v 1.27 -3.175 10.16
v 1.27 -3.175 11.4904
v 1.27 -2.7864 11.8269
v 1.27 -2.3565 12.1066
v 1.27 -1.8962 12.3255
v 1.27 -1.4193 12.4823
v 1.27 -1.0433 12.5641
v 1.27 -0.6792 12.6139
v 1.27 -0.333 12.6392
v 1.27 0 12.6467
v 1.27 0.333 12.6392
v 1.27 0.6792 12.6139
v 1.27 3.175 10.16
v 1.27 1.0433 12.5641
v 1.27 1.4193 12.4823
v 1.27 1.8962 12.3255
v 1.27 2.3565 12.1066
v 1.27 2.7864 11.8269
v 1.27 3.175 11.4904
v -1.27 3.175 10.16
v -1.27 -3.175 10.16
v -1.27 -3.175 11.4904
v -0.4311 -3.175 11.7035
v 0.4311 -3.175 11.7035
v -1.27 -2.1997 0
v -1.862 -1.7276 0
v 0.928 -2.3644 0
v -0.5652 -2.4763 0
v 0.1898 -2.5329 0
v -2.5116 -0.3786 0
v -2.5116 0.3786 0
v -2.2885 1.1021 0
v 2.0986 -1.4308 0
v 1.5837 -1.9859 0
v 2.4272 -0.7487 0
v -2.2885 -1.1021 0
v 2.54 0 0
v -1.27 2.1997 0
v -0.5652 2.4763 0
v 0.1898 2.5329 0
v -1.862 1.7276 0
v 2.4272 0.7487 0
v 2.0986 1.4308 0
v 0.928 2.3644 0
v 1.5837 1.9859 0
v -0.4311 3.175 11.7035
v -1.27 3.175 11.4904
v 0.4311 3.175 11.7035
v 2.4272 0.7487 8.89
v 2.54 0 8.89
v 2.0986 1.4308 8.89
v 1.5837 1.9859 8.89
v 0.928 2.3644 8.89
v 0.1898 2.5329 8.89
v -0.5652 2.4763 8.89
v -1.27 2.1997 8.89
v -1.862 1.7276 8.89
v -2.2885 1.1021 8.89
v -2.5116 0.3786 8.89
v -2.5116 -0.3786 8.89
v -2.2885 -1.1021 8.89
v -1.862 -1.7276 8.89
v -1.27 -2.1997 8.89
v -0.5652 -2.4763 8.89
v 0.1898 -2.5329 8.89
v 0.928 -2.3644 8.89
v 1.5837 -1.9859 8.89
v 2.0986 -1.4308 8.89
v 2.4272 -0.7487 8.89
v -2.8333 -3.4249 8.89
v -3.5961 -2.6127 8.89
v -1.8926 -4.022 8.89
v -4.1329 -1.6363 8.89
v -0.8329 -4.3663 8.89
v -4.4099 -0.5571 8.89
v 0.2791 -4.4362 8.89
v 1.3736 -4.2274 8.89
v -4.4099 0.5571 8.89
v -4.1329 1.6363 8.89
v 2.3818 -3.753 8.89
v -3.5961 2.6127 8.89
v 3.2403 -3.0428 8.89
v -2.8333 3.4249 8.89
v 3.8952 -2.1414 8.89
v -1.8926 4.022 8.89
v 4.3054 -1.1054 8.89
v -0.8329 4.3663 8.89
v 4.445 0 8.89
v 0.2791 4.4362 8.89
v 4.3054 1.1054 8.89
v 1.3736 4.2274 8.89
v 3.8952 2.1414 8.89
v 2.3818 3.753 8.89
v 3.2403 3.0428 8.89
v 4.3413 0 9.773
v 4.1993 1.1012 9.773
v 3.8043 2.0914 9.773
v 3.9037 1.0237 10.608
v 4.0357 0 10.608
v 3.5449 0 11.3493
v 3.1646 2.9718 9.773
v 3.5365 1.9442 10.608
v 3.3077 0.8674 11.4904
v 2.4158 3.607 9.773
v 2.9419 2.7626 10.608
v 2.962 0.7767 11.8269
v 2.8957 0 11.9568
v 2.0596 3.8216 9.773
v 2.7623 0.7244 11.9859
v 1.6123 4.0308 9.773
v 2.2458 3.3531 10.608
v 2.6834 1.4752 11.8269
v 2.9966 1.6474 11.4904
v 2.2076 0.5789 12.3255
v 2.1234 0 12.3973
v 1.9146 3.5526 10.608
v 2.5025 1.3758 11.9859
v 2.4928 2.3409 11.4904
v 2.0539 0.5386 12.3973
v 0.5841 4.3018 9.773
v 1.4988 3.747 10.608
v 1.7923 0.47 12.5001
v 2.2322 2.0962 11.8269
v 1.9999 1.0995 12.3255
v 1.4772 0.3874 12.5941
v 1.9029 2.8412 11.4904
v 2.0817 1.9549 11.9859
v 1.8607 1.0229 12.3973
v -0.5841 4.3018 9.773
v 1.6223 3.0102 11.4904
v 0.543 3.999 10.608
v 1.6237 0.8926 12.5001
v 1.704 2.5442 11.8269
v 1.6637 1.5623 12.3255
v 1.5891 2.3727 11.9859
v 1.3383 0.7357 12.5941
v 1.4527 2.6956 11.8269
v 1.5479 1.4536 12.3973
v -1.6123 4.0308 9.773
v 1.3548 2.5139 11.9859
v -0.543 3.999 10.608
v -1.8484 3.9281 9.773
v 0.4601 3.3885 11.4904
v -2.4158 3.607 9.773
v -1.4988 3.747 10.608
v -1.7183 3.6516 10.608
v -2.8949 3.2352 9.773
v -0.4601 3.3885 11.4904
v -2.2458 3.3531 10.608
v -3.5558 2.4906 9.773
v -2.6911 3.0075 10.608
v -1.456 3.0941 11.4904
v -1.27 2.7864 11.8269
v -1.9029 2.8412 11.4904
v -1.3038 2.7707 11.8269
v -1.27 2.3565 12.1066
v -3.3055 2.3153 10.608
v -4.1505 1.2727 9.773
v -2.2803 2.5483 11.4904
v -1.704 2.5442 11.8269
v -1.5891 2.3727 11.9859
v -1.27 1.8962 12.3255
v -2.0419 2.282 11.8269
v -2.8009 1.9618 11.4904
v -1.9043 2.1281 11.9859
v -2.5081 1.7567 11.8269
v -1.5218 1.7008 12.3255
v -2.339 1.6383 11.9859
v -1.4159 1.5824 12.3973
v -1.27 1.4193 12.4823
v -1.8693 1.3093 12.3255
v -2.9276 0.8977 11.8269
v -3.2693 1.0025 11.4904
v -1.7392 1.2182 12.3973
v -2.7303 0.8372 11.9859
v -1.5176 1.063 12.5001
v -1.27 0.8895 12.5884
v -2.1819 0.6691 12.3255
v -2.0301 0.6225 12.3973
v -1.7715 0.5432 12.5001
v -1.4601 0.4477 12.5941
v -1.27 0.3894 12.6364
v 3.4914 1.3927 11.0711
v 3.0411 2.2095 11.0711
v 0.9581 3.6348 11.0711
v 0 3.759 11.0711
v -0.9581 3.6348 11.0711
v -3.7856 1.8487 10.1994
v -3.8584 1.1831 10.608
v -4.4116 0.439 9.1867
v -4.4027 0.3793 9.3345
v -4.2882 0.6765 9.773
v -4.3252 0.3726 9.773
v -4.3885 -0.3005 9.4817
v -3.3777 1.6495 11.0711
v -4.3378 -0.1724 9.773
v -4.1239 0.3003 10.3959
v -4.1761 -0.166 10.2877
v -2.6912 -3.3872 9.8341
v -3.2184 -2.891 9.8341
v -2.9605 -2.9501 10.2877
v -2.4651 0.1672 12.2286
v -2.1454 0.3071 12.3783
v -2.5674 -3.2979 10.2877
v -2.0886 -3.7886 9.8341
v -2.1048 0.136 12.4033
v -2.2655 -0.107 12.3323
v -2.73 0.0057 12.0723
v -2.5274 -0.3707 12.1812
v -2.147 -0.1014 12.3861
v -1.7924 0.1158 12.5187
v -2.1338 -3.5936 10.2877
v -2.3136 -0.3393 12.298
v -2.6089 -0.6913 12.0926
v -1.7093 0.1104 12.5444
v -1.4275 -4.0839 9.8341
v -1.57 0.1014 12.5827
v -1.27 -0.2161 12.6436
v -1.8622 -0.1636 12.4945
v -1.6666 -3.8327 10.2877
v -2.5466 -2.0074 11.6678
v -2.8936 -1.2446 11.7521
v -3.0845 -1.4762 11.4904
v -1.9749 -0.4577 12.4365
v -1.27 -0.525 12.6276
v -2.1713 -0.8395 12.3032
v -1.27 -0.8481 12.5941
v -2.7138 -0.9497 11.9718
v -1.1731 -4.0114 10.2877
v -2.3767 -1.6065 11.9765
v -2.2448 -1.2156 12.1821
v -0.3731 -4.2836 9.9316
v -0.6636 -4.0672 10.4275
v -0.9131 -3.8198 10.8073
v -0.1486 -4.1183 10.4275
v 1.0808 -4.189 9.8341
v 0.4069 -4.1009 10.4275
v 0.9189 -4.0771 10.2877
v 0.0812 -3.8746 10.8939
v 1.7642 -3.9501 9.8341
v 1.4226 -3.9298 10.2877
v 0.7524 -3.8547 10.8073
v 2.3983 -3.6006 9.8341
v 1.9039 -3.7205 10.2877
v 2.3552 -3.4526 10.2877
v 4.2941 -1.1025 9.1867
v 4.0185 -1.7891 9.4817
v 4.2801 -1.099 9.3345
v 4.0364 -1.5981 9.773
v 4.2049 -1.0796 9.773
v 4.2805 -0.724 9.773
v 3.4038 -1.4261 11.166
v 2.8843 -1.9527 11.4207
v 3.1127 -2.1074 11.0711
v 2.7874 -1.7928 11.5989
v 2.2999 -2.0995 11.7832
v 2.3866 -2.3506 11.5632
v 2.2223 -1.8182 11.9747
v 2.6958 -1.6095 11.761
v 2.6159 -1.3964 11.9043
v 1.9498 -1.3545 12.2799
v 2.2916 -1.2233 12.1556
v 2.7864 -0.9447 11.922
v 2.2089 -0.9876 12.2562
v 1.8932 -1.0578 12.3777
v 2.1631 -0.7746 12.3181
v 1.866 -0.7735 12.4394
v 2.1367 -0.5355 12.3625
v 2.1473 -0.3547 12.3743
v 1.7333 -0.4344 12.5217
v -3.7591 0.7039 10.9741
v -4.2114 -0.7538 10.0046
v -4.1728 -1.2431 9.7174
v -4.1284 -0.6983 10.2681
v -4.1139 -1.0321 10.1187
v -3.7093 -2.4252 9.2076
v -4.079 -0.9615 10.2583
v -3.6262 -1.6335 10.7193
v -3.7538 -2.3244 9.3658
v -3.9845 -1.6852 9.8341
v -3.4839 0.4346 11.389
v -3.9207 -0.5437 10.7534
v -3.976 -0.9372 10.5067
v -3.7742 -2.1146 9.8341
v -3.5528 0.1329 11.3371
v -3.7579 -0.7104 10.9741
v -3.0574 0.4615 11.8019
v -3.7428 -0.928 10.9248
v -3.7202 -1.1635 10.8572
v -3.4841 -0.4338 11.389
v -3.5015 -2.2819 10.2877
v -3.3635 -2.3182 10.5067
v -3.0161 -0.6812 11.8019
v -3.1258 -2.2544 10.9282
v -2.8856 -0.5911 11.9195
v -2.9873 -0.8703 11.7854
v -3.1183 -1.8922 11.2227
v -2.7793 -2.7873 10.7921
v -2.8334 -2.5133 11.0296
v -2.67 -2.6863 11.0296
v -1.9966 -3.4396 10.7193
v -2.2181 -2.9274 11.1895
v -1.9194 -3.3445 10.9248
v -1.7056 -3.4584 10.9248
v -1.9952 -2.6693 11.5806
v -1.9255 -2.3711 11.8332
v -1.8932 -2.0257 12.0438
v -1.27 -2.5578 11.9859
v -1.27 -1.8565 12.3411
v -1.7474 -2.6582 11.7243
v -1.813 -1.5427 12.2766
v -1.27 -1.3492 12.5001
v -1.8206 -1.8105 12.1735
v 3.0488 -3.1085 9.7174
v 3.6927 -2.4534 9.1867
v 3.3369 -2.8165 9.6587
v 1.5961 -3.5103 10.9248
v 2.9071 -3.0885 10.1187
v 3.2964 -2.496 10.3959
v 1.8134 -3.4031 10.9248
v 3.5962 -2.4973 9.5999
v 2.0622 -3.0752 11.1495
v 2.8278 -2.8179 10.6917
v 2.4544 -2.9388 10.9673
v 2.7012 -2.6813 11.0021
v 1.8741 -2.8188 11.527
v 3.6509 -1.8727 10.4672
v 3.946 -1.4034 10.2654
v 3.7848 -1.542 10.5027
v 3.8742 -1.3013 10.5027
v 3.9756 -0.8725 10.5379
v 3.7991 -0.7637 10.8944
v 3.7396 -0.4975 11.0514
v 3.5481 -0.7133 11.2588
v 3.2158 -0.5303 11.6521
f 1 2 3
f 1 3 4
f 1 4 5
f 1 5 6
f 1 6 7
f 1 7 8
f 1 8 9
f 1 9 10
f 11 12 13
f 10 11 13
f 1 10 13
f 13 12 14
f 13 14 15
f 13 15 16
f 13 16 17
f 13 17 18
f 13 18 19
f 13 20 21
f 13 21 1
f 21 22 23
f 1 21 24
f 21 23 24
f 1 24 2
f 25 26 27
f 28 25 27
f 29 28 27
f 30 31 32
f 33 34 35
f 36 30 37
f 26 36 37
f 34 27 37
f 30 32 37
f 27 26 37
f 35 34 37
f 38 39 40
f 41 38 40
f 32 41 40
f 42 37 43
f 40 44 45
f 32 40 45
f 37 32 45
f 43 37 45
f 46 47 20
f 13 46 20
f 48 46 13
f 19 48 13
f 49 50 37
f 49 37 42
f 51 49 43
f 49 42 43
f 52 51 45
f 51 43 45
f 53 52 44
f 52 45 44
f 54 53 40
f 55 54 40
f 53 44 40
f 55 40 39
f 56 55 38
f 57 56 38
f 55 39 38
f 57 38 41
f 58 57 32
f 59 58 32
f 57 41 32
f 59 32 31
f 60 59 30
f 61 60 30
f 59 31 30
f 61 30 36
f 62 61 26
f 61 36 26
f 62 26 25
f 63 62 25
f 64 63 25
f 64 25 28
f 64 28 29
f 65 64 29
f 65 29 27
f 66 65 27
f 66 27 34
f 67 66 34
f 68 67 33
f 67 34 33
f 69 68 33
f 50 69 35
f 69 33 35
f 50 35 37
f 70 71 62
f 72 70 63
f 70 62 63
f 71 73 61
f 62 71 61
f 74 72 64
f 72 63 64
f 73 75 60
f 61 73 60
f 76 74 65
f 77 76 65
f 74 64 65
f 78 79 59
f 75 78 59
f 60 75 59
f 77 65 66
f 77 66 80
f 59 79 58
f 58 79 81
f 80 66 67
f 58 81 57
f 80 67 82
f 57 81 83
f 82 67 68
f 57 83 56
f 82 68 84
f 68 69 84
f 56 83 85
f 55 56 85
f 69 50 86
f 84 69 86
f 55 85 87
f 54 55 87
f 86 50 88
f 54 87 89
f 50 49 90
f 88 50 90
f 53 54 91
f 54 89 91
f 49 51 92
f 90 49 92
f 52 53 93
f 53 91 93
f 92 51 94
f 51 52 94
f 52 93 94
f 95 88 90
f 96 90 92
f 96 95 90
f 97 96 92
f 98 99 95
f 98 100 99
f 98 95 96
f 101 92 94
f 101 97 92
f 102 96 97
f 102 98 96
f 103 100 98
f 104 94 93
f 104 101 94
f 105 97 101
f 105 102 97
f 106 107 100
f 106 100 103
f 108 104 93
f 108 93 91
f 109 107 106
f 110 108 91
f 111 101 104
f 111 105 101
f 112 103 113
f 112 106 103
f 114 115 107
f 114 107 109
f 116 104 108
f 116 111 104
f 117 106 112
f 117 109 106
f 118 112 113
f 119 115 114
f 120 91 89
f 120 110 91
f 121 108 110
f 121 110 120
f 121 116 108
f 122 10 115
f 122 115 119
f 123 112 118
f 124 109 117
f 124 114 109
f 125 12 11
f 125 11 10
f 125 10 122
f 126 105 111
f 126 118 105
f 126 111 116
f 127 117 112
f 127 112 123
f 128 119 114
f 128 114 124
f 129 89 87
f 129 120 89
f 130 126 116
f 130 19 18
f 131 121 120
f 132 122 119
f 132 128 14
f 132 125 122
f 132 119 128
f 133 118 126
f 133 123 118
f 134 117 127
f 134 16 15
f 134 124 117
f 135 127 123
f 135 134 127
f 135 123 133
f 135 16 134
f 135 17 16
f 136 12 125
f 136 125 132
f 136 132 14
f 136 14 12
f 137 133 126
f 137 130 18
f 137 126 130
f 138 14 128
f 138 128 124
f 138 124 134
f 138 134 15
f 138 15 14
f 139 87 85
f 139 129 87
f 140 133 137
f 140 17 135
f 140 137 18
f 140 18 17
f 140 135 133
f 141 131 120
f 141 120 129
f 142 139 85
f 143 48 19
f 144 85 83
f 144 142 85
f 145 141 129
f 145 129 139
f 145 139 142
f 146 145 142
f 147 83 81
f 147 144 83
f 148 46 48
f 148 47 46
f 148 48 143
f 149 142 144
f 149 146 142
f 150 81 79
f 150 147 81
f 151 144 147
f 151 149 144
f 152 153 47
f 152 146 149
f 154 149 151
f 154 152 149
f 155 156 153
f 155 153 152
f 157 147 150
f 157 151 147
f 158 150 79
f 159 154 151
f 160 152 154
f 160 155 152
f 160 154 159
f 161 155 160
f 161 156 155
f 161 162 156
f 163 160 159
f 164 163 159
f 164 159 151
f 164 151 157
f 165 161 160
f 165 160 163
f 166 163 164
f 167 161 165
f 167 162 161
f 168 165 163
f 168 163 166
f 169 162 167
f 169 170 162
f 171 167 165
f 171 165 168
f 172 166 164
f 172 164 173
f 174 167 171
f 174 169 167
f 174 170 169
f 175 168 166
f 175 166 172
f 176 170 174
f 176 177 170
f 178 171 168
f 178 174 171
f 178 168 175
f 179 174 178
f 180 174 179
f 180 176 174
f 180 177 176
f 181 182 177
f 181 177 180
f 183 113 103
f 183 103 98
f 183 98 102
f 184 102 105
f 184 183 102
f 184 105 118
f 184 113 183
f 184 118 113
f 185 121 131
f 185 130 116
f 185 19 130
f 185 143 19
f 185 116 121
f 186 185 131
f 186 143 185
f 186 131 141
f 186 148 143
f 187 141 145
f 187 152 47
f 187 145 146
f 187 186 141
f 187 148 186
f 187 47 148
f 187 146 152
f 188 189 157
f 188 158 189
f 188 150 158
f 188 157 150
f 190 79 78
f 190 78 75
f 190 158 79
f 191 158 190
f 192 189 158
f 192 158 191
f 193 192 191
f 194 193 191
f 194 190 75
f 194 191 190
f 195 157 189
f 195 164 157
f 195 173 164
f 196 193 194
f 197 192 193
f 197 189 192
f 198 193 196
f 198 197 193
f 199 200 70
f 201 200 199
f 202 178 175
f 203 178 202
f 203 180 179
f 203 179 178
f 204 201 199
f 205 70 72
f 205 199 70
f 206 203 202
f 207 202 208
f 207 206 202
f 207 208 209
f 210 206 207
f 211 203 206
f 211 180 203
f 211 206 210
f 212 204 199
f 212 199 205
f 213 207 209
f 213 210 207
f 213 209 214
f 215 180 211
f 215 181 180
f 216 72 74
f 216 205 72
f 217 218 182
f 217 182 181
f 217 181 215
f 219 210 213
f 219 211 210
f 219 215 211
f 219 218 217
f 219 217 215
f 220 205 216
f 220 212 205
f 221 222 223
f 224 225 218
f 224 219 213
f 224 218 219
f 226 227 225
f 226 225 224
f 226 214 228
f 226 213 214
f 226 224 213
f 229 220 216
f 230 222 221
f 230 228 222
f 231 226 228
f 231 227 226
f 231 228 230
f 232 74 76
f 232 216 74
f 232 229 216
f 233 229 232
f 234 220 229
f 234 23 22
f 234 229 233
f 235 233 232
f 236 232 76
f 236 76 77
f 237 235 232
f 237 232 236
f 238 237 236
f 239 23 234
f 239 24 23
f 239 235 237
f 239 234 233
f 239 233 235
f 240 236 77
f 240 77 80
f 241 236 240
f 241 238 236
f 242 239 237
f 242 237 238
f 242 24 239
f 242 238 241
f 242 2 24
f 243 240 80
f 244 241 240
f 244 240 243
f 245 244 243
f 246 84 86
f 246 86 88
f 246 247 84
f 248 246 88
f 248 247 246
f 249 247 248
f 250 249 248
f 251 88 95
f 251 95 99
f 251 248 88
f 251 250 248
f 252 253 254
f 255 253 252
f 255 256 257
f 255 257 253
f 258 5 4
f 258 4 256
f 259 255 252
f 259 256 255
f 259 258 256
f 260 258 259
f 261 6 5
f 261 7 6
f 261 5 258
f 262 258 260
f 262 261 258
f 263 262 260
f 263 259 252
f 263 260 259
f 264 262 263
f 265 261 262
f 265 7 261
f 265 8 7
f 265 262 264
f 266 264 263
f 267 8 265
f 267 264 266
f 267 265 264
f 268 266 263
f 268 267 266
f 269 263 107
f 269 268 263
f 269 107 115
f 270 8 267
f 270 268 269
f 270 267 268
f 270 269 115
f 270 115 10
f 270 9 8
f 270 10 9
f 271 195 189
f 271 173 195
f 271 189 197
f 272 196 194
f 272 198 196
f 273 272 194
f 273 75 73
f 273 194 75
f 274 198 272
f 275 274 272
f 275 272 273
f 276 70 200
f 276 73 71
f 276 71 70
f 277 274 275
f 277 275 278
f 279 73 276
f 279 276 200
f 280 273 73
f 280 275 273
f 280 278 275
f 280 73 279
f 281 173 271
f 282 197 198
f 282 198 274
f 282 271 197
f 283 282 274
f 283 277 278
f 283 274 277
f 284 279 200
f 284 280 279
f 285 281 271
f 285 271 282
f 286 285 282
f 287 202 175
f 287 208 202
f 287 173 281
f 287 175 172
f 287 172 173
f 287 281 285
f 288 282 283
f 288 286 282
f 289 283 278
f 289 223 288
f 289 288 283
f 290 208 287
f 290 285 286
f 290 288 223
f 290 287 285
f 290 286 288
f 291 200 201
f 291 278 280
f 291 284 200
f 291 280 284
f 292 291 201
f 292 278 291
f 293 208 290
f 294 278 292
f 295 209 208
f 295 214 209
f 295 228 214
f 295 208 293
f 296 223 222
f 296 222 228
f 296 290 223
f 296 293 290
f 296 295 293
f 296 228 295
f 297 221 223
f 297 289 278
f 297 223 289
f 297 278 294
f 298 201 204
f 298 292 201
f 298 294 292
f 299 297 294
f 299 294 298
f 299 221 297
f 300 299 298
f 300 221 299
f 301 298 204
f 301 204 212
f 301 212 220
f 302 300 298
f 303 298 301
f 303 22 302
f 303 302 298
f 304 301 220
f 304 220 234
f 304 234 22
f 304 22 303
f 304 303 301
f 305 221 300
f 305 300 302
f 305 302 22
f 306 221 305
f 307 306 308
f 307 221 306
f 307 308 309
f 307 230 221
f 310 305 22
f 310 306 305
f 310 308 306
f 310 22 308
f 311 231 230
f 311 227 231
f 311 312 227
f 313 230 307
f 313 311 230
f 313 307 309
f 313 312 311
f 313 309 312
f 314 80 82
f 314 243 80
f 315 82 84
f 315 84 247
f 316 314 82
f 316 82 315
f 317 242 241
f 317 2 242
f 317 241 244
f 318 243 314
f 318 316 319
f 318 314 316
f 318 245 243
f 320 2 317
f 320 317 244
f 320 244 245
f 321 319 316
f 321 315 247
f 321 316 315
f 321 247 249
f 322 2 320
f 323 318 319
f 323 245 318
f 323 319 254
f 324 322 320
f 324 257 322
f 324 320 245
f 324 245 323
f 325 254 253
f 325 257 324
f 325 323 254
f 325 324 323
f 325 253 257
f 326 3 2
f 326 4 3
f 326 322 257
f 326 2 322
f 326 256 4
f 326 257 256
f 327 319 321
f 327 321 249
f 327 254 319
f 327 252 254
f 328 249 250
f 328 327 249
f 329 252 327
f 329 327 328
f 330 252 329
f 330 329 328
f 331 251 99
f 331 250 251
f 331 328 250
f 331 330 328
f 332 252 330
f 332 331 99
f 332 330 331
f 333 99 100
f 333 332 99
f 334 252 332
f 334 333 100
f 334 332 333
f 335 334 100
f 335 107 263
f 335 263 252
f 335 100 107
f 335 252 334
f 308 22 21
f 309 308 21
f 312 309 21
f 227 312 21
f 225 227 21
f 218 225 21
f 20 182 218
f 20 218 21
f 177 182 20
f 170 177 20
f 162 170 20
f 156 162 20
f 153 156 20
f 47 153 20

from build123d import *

# Parameters (mm, degrees)
F0_R     = 2.54
F1_DEPTH = 8.89
F2_R     = 4.445
F3_DEPTH = 3.81
F4_W     = 2.54
F4_H     = 6.35
F5_DEPTH = 2.54


# Not quite as in the source:
# - a fillet or chamfer that OpenCascade refuses, or shapes differently, is made with other operations: its cross-section is extruded or revolved along the edge and cut away or added


with BuildPart() as f1:
    # F0 (on Top) → F1 (new body)
    with BuildSketch(Plane.XY):
        Circle(F0_R)
    extrude(amount=F1_DEPTH)

    # F2 (on face) → F3 (join)
    with BuildSketch(Plane.XY.offset(8.89)):
        Circle(F2_R)
    extrude(amount=F3_DEPTH)

    # F4 (on face) → F5 (cut)
    with BuildSketch(Plane.XY.offset(12.7)):
        Rectangle(F4_W, F4_H)
    extrude(amount=-F5_DEPTH, mode=Mode.SUBTRACT)

    # F6: fillet of radius 3.81 on 1 edges, made by hand

    # F6_s1 → F6_t2 (revolve, cut)
    with BuildSketch(Plane.XZ):
        with BuildLine():
            ThreePointArc((4.445, 8.89), (3.3290768363, 11.5840768363), (0.635, 12.7))
            Line((0.635, 12.7), (4.445, 12.7))
            Line((4.445, 12.7), (4.445, 8.89))
        make_face()
    revolve(axis=Axis((0, 0, 12.7), (0, 0, 1)), mode=Mode.SUBTRACT)


solid = f1.part
